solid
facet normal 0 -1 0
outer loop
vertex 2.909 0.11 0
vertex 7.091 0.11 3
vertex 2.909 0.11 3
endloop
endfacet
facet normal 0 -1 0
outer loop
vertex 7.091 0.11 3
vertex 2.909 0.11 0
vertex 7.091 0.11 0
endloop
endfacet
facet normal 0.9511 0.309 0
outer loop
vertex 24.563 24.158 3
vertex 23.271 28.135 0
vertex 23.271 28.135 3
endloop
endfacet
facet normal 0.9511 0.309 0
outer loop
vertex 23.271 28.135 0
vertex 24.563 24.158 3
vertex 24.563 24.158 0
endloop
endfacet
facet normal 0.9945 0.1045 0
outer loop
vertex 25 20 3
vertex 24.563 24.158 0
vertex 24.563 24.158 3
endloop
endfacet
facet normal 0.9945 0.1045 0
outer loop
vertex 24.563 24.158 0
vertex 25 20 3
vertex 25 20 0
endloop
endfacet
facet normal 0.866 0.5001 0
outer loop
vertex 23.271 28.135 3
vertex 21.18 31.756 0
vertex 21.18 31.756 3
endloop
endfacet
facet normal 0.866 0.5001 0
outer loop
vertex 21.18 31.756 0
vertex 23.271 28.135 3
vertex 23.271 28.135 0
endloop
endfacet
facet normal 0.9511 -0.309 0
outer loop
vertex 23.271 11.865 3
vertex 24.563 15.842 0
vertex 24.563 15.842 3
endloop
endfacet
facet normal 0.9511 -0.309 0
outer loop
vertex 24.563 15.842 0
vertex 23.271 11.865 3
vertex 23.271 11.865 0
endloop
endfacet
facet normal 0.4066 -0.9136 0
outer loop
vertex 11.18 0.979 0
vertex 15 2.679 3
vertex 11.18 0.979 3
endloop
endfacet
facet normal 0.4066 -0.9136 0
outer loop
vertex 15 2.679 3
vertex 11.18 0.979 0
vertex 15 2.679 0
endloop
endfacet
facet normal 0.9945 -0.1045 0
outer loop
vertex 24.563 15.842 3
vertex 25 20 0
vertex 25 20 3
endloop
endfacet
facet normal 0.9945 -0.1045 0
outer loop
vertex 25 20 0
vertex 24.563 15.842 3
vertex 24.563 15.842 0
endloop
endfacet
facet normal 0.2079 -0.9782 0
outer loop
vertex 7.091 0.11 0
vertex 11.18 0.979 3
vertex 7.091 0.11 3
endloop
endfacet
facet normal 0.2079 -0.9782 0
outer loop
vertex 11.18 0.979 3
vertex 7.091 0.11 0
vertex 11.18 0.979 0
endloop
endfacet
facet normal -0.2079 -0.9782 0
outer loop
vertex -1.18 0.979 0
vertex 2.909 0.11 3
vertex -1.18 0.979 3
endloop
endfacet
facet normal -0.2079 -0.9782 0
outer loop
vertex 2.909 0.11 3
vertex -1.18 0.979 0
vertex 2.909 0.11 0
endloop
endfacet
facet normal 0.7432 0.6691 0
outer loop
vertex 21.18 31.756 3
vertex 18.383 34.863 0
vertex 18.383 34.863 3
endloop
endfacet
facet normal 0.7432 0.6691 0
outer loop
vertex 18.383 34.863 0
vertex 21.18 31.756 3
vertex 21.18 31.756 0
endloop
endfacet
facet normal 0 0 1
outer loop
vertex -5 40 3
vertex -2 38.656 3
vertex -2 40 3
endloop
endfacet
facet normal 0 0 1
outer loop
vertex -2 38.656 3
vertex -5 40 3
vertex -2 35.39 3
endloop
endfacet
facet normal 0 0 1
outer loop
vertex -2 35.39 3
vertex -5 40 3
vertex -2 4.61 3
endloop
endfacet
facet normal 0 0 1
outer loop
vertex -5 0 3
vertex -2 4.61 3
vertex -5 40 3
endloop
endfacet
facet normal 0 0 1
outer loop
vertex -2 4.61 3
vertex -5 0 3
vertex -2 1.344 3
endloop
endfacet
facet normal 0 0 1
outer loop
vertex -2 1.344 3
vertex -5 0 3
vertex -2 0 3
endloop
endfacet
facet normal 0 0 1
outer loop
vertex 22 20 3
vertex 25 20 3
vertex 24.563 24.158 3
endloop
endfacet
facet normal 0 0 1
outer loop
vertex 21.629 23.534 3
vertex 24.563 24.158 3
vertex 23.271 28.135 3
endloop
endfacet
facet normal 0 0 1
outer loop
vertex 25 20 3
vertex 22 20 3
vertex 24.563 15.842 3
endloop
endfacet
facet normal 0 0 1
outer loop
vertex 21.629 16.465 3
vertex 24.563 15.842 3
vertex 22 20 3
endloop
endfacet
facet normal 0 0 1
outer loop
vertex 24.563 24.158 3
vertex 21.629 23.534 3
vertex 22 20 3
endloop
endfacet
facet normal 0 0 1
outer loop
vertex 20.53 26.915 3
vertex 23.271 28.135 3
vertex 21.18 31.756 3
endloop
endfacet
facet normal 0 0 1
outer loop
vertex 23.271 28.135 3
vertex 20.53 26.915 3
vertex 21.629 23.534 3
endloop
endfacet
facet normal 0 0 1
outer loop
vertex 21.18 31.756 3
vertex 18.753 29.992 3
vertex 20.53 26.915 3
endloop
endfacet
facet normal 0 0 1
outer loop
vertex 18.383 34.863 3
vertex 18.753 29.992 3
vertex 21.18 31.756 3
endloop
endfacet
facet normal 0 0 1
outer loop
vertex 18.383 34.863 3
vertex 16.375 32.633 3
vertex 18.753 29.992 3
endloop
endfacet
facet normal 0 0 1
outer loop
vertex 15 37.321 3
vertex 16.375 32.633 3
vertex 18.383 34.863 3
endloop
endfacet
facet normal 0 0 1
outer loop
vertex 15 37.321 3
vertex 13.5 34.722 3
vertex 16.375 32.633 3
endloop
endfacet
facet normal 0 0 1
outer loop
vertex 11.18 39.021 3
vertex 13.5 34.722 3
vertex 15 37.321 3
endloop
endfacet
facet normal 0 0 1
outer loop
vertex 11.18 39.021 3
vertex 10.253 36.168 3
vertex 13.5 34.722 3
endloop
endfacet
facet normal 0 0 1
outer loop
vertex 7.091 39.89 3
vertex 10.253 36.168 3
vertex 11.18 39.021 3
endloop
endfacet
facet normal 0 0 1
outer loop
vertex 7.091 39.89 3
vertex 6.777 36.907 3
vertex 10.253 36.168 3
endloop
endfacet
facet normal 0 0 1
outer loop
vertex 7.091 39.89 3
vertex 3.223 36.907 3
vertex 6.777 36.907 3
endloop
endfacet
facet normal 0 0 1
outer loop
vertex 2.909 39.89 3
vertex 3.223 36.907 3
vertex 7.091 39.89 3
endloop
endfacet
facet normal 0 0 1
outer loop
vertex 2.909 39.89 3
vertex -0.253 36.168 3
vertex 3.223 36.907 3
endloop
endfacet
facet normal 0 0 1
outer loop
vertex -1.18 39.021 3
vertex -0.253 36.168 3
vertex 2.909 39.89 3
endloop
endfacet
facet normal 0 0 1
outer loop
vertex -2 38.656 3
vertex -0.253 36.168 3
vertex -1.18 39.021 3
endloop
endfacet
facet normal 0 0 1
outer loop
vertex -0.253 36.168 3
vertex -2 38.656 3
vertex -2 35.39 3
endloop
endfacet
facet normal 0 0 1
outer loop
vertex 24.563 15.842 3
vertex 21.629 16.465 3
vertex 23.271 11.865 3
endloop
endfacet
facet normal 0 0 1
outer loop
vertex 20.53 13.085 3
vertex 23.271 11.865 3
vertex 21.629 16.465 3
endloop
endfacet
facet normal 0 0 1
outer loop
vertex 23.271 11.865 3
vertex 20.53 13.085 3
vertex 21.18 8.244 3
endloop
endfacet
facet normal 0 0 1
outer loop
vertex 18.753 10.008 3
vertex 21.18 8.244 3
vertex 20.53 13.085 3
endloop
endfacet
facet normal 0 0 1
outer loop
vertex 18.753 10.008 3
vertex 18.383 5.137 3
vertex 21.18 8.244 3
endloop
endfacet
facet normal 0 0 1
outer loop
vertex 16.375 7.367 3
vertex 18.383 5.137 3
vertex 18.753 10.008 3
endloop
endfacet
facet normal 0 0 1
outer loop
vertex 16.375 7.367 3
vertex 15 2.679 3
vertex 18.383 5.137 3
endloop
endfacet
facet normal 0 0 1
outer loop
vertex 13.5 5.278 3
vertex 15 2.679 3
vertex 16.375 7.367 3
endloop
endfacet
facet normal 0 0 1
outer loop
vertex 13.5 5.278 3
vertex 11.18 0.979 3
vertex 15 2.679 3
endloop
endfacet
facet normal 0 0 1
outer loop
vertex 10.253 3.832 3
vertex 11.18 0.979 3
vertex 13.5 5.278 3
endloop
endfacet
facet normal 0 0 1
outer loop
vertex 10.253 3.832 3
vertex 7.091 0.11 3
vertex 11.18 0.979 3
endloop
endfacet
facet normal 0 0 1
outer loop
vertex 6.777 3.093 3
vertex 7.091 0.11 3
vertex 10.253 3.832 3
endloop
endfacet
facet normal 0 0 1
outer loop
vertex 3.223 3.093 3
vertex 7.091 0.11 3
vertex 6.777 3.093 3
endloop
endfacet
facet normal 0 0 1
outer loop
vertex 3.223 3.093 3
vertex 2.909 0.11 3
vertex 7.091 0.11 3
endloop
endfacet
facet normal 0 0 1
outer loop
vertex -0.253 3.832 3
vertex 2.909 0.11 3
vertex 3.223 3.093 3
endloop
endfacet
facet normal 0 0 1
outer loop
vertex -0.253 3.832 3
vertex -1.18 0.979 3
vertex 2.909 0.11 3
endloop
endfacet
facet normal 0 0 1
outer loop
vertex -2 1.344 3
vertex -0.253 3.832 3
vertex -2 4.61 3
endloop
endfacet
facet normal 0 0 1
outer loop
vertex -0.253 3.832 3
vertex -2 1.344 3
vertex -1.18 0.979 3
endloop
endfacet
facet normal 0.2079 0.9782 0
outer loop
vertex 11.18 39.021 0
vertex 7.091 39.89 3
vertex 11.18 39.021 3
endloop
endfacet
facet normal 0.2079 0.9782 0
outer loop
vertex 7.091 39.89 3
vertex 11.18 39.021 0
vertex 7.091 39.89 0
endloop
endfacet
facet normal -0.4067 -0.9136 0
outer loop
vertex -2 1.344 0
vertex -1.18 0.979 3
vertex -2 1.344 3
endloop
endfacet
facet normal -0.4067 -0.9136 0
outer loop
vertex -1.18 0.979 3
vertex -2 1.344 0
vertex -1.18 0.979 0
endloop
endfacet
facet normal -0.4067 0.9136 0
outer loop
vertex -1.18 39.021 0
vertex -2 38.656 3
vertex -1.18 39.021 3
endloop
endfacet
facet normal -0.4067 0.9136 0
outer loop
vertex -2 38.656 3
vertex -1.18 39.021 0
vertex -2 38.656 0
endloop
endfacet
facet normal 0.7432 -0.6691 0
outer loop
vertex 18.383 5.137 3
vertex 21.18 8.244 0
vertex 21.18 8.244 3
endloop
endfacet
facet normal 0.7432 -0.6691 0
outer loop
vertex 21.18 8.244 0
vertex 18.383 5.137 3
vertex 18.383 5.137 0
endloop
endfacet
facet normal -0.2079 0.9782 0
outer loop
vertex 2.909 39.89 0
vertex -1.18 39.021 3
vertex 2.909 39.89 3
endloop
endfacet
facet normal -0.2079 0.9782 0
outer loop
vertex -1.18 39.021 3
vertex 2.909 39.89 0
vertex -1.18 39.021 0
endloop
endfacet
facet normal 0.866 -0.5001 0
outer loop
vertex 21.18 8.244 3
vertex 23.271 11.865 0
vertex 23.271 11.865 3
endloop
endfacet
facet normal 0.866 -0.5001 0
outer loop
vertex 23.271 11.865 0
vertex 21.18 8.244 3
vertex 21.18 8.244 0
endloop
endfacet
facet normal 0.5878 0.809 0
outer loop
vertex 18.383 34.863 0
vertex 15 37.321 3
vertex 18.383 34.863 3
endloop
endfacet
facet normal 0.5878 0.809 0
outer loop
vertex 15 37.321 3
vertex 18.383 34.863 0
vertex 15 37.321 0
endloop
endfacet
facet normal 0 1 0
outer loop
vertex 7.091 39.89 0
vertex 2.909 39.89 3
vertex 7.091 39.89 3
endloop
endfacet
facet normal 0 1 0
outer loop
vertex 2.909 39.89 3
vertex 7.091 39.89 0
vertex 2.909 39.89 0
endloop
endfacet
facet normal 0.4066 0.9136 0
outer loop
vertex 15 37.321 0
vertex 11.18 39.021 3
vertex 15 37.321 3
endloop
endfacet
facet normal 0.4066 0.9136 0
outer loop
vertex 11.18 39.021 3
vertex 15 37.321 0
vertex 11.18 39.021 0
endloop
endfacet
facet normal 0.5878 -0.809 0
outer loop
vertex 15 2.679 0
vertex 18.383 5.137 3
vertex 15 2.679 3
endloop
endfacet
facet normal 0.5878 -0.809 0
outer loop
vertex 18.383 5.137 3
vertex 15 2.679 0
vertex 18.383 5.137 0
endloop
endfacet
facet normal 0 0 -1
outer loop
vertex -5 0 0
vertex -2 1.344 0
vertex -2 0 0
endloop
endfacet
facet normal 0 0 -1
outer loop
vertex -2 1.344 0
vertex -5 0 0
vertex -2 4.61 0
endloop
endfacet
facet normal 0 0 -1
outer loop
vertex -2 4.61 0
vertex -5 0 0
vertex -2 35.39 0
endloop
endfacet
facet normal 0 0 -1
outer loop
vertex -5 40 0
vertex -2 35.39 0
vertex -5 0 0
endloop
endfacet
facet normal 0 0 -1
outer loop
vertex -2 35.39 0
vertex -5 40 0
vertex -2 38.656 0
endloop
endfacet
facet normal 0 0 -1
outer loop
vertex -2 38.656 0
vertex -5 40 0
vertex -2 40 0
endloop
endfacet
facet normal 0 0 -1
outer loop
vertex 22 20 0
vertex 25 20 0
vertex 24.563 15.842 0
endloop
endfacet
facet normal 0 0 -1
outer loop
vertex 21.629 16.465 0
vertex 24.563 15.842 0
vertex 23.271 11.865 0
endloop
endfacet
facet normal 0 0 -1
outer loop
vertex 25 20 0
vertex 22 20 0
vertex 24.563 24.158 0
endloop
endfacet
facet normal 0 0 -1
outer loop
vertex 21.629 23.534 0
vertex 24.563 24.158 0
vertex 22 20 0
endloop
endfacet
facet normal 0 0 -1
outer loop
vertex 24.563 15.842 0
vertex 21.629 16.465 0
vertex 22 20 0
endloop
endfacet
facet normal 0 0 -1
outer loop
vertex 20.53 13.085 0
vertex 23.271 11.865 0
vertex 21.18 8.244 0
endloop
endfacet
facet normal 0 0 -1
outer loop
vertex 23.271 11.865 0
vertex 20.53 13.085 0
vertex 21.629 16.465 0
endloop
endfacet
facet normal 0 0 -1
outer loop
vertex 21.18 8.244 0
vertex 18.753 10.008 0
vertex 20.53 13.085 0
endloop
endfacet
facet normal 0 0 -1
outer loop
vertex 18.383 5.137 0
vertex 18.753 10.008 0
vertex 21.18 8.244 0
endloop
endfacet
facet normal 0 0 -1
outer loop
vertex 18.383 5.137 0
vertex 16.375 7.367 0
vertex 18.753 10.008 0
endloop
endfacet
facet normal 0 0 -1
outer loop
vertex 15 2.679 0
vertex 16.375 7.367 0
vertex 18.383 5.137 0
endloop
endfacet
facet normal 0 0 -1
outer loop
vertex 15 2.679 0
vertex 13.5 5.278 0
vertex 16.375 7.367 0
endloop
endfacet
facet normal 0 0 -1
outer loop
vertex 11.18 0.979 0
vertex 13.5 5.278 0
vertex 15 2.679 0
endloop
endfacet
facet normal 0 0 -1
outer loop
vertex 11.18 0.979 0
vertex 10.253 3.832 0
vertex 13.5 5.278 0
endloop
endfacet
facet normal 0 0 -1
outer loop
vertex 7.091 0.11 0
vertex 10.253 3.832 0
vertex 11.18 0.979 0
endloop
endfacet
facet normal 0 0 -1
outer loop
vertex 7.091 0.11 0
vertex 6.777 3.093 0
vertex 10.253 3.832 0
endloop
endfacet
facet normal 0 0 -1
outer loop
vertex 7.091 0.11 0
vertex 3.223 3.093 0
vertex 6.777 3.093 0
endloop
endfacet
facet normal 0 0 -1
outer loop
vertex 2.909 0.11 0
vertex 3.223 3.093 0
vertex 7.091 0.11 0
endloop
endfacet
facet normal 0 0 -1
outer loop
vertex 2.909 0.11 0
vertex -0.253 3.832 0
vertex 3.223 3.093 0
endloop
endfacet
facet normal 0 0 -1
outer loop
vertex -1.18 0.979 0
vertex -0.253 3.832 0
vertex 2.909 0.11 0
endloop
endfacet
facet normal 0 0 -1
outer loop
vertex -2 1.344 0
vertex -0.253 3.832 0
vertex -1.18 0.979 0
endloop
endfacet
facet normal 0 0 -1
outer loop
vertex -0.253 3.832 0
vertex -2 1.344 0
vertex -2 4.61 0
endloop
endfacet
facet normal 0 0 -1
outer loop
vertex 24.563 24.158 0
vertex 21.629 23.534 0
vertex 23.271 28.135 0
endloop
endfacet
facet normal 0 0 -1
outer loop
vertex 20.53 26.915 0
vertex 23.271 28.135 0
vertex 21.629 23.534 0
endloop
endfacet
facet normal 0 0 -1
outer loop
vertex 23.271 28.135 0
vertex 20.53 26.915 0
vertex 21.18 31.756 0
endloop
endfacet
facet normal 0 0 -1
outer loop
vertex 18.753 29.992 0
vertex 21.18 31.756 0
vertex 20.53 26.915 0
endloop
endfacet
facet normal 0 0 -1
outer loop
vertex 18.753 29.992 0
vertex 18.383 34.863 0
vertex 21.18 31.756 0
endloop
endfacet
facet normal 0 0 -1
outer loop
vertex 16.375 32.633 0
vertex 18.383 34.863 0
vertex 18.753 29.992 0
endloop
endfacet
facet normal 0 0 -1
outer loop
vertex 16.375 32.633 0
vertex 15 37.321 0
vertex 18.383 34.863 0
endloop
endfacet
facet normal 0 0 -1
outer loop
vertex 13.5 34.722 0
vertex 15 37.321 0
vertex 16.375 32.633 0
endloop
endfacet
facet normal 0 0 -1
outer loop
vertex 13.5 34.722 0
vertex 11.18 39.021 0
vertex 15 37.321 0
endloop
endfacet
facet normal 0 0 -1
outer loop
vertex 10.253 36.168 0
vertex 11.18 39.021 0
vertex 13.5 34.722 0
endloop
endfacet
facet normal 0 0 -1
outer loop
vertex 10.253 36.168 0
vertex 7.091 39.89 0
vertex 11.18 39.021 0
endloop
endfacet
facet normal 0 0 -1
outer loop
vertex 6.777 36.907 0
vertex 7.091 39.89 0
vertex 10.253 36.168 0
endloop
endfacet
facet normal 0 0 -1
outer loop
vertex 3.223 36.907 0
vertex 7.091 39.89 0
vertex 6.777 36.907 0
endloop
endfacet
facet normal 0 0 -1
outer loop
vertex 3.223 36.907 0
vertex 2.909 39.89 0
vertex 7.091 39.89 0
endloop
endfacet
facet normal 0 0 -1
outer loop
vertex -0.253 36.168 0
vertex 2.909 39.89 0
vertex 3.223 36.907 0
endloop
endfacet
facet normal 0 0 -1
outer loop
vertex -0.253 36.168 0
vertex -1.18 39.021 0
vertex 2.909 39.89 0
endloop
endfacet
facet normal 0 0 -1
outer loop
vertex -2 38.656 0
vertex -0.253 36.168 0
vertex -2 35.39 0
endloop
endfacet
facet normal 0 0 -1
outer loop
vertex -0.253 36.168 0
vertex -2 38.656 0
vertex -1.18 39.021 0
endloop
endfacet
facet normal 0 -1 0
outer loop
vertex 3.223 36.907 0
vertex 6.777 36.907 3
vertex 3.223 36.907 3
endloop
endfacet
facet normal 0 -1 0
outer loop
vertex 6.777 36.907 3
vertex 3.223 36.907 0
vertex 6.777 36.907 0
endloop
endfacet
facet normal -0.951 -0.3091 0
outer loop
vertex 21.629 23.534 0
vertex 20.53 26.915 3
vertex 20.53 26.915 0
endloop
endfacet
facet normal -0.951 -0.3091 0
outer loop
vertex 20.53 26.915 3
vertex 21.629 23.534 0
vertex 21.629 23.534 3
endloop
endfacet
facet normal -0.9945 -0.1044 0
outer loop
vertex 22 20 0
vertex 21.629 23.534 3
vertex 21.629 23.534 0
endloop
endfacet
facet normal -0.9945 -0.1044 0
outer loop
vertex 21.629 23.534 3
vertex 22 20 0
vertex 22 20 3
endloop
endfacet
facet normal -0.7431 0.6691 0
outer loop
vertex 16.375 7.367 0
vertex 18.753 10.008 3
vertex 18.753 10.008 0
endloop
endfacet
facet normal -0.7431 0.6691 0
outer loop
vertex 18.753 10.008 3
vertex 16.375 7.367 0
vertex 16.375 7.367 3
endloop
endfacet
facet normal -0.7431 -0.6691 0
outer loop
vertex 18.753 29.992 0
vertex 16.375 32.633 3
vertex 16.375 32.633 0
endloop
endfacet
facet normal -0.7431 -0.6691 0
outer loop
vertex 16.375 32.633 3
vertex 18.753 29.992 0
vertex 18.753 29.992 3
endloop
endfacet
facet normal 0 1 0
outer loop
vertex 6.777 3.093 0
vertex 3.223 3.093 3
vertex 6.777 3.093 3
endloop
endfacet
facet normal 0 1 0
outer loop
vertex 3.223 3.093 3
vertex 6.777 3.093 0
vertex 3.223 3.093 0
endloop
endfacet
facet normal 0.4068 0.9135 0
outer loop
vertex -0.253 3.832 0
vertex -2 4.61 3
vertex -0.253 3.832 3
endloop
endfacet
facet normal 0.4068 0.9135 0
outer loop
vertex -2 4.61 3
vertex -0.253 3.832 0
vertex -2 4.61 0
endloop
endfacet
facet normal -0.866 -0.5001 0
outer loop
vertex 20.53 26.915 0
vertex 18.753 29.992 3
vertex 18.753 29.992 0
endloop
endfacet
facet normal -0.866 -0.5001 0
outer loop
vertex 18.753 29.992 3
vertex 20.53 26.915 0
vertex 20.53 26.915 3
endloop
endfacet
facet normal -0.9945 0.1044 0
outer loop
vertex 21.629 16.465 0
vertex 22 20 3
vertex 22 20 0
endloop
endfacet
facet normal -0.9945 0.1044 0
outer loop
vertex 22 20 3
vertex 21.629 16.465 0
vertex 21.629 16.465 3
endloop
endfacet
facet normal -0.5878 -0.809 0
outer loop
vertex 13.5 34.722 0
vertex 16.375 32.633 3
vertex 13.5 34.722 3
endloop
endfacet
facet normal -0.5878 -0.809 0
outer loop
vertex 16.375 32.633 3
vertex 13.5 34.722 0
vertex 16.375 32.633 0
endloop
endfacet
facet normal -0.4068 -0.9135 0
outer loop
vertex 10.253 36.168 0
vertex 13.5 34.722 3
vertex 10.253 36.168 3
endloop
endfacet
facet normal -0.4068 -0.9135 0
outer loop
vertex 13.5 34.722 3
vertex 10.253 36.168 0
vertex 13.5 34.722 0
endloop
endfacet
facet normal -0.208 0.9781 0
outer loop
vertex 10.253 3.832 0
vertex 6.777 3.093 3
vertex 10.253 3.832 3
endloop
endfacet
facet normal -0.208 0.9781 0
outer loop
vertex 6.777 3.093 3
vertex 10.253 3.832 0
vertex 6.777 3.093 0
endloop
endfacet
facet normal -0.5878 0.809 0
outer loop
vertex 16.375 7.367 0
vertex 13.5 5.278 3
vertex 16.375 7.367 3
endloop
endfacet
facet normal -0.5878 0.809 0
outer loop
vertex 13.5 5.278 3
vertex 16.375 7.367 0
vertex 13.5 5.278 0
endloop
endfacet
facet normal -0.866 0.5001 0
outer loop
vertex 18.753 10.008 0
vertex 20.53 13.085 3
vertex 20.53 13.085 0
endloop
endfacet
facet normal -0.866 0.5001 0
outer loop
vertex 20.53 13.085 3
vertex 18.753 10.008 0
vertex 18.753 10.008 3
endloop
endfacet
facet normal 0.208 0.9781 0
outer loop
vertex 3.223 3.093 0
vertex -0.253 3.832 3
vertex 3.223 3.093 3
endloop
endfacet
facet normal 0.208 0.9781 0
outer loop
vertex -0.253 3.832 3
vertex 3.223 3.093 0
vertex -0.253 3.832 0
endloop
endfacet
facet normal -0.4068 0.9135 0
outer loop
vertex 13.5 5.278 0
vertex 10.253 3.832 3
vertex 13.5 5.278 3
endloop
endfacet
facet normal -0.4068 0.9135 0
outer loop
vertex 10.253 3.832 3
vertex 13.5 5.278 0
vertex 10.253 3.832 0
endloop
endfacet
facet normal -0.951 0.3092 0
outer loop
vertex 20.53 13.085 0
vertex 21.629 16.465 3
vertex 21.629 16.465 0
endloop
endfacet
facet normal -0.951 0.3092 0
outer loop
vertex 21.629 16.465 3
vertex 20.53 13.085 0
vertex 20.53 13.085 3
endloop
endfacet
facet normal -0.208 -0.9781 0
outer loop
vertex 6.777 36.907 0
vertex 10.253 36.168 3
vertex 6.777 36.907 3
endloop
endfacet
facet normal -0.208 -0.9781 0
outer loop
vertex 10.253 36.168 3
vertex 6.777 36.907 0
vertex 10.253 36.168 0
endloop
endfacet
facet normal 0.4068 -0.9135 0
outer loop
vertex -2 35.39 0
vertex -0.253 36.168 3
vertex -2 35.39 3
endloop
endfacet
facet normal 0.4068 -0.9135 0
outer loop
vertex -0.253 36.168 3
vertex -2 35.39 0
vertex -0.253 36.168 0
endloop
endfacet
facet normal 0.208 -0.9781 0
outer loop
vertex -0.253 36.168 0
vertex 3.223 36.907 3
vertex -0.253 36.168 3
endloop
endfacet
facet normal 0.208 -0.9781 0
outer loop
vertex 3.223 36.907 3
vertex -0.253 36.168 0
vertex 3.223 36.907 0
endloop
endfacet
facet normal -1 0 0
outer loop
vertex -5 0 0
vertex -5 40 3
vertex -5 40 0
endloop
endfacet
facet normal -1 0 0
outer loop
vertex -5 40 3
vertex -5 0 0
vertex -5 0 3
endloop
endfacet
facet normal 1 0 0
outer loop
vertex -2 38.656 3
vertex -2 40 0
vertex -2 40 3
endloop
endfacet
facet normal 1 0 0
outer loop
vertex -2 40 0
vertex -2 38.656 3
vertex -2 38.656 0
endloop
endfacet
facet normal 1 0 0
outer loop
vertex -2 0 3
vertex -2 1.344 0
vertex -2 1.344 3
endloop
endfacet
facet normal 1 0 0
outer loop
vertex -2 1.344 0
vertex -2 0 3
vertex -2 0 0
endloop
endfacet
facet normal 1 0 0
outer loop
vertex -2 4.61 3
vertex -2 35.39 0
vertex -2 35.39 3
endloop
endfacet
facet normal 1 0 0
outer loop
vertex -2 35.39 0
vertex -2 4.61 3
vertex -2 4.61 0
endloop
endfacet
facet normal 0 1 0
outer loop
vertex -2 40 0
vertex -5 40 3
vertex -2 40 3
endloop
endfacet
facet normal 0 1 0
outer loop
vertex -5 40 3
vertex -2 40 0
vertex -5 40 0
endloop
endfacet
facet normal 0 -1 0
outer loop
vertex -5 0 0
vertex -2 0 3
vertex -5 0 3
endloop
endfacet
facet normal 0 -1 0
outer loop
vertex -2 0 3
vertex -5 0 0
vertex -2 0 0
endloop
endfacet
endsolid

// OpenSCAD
//буква d
 translate([-5,0,0]) cube([3,40,3]);
difference(){
 translate([5,20,0]) cylinder(3,20,20);
 translate([5,20,-1]) cylinder(5,17,17);
 translate([-15,0,-1]) cube([10,40,5]);
}
